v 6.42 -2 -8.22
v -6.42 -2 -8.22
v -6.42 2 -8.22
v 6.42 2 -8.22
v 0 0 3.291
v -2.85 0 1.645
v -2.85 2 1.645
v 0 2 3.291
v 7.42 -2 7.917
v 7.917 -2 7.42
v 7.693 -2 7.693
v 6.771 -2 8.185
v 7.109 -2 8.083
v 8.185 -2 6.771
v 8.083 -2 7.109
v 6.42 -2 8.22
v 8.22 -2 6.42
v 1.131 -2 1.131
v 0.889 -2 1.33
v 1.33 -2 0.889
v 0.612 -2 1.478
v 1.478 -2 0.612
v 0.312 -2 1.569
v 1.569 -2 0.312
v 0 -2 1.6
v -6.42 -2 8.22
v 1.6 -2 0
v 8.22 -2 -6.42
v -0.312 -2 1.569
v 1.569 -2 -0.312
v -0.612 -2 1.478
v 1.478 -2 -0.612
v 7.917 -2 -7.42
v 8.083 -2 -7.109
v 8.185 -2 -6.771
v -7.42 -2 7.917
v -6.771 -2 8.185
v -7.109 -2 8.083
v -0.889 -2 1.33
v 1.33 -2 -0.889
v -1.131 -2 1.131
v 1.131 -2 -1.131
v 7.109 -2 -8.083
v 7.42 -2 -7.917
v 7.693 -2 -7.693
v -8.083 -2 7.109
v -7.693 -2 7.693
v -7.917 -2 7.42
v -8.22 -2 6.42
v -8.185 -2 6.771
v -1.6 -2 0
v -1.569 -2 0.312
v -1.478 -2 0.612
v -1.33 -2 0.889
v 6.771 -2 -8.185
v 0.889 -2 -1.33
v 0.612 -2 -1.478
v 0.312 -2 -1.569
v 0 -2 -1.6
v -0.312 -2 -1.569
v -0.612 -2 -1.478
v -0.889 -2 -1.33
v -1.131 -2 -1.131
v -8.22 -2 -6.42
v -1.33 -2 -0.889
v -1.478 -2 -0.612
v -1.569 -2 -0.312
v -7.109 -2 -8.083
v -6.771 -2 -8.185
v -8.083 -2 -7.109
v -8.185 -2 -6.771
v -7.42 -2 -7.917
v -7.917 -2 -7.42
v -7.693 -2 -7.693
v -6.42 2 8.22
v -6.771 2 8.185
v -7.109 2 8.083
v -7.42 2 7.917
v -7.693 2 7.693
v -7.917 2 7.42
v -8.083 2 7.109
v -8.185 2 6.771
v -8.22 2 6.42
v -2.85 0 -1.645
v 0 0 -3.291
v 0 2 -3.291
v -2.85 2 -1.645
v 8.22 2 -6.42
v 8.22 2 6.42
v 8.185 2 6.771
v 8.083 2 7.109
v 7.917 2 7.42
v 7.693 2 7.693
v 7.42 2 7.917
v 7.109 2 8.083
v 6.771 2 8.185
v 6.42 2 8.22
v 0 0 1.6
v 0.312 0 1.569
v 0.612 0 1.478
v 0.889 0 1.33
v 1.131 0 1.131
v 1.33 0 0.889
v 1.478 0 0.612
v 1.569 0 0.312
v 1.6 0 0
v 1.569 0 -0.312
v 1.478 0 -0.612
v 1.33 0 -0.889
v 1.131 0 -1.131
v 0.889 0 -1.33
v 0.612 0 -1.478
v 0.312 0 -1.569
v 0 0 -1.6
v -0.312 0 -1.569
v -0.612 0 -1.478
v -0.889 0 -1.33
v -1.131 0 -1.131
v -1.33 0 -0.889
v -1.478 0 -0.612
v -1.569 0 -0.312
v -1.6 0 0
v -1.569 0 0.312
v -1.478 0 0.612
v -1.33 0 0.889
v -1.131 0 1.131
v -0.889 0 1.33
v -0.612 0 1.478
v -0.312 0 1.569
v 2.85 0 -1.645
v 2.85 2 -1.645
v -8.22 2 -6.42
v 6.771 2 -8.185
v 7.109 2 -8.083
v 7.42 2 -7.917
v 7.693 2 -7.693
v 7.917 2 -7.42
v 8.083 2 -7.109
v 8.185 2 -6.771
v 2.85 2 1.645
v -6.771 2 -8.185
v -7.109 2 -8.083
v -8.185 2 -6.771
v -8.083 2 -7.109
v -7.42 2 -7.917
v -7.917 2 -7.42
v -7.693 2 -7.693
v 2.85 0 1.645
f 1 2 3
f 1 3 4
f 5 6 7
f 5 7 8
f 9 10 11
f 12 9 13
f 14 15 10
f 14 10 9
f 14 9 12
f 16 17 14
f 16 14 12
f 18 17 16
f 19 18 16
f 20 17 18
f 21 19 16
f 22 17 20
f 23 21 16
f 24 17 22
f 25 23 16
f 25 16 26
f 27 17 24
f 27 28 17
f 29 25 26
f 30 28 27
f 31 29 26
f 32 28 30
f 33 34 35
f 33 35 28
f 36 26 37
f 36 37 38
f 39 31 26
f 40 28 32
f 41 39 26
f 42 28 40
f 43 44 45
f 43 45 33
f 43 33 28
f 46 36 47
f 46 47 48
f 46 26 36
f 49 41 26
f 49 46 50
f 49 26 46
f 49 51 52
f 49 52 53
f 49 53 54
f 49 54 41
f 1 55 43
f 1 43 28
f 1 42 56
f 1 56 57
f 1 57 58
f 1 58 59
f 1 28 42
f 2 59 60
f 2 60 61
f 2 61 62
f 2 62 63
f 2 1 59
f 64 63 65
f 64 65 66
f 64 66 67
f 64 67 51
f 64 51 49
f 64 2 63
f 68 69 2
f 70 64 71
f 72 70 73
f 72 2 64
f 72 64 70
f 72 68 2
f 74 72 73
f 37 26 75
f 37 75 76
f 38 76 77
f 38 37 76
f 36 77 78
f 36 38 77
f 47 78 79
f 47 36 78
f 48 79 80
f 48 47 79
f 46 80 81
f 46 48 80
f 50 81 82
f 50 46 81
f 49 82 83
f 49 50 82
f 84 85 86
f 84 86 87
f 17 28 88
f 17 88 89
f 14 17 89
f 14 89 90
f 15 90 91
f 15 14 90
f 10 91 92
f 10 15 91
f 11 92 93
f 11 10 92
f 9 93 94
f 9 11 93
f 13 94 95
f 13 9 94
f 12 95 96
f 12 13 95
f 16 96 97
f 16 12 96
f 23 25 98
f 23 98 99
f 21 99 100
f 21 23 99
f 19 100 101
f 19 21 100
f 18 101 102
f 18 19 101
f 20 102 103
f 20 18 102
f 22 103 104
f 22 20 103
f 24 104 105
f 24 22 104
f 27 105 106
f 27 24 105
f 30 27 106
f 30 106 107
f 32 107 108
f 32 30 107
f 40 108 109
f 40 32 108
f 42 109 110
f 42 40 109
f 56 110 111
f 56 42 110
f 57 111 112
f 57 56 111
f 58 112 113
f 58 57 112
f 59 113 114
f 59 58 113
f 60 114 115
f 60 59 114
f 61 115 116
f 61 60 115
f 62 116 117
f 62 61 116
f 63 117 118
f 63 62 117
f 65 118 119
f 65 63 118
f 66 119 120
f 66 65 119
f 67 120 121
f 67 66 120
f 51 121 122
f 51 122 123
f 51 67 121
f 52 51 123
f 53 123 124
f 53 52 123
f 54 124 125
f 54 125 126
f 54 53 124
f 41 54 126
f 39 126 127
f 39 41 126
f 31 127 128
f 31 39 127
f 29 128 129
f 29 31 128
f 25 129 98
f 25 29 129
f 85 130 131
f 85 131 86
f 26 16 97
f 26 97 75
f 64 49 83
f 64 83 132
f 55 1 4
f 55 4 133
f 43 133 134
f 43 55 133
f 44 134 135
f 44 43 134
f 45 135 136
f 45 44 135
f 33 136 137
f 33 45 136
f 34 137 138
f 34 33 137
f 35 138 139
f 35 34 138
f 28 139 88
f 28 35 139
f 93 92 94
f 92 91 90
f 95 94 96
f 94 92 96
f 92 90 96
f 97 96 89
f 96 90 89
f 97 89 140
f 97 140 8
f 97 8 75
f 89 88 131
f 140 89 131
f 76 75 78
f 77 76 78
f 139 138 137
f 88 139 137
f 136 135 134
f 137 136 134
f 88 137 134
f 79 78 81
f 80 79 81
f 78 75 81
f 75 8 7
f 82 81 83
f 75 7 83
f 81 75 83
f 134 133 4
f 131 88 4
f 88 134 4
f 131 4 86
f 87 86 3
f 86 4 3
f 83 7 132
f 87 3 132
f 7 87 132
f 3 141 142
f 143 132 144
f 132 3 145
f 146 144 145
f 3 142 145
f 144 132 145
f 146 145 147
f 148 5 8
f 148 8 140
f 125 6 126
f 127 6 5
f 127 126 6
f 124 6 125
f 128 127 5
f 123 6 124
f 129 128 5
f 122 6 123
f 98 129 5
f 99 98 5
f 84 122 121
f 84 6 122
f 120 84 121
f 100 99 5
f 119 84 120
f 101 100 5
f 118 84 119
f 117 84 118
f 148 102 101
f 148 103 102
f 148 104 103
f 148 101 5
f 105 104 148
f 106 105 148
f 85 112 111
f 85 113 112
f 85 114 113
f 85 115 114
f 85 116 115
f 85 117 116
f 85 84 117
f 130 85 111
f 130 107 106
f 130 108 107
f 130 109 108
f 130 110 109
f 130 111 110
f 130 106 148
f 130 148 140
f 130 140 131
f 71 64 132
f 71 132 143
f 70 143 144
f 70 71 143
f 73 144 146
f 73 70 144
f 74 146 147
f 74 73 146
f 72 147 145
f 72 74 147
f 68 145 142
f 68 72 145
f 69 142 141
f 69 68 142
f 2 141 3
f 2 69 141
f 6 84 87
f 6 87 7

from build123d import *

# Parameters (mm, degrees)
EXTRUDE_5_DEPTH = 2
EXTRUDE_START   = -2
SKETCH_1_7_R    = 1.6
EXTRUDE_6_DEPTH = 2


with BuildPart() as part:
    # 草图1 → 凸台-拉伸5 (new body)
    with BuildSketch(Plane(origin=(0, 0, 0), x_dir=(1, 0, 0), z_dir=(0, 1, 0))):
        with BuildLine():
            Line((-8.22, 6.42), (-8.22, -6.42))
            ThreePointArc((-8.22, -6.42), (-7.692792206, -7.692792206), (-6.42, -8.22))
            Line((-6.42, -8.22), (6.42, -8.22))
            ThreePointArc((6.42, -8.22), (7.692792206, -7.692792206), (8.22, -6.42))
            Line((8.22, -6.42), (8.22, 6.42))
            ThreePointArc((8.22, 6.42), (7.692792206, 7.692792206), (6.42, 8.22))
            Line((6.42, 8.22), (-6.42, 8.22))
            ThreePointArc((-6.42, 8.22), (-7.692792206, 7.692792206), (-8.22, 6.42))
        make_face()
        Polygon((2.85, -1.645448267), (0, -3.290896534), (-2.85, -1.645448267), (-2.85, 1.645448267), (0, 3.290896534), (2.85, 1.645448267), align=None, mode=Mode.SUBTRACT)
    extrude(amount=EXTRUDE_5_DEPTH)

    # 草图1<7> → 凸台-拉伸6 (add)
    with BuildSketch(Plane(origin=(0, 0, 0), x_dir=(1, 0, 0), z_dir=(0, 1, 0)).offset(EXTRUDE_START)):
        with BuildLine():
            Line((-8.22, 6.42), (-8.22, -6.42))
            ThreePointArc((-8.22, -6.42), (-7.692792206, -7.692792206), (-6.42, -8.22))
            Line((-6.42, -8.22), (6.42, -8.22))
            ThreePointArc((6.42, -8.22), (7.692792206, -7.692792206), (8.22, -6.42))
            Line((8.22, -6.42), (8.22, 6.42))
            ThreePointArc((8.22, 6.42), (7.692792206, 7.692792206), (6.42, 8.22))
            Line((6.42, 8.22), (-6.42, 8.22))
            ThreePointArc((-6.42, 8.22), (-7.692792206, 7.692792206), (-8.22, 6.42))
        make_face()
        Circle(SKETCH_1_7_R, mode=Mode.SUBTRACT)
    extrude(amount=EXTRUDE_6_DEPTH)


solid = part.part
